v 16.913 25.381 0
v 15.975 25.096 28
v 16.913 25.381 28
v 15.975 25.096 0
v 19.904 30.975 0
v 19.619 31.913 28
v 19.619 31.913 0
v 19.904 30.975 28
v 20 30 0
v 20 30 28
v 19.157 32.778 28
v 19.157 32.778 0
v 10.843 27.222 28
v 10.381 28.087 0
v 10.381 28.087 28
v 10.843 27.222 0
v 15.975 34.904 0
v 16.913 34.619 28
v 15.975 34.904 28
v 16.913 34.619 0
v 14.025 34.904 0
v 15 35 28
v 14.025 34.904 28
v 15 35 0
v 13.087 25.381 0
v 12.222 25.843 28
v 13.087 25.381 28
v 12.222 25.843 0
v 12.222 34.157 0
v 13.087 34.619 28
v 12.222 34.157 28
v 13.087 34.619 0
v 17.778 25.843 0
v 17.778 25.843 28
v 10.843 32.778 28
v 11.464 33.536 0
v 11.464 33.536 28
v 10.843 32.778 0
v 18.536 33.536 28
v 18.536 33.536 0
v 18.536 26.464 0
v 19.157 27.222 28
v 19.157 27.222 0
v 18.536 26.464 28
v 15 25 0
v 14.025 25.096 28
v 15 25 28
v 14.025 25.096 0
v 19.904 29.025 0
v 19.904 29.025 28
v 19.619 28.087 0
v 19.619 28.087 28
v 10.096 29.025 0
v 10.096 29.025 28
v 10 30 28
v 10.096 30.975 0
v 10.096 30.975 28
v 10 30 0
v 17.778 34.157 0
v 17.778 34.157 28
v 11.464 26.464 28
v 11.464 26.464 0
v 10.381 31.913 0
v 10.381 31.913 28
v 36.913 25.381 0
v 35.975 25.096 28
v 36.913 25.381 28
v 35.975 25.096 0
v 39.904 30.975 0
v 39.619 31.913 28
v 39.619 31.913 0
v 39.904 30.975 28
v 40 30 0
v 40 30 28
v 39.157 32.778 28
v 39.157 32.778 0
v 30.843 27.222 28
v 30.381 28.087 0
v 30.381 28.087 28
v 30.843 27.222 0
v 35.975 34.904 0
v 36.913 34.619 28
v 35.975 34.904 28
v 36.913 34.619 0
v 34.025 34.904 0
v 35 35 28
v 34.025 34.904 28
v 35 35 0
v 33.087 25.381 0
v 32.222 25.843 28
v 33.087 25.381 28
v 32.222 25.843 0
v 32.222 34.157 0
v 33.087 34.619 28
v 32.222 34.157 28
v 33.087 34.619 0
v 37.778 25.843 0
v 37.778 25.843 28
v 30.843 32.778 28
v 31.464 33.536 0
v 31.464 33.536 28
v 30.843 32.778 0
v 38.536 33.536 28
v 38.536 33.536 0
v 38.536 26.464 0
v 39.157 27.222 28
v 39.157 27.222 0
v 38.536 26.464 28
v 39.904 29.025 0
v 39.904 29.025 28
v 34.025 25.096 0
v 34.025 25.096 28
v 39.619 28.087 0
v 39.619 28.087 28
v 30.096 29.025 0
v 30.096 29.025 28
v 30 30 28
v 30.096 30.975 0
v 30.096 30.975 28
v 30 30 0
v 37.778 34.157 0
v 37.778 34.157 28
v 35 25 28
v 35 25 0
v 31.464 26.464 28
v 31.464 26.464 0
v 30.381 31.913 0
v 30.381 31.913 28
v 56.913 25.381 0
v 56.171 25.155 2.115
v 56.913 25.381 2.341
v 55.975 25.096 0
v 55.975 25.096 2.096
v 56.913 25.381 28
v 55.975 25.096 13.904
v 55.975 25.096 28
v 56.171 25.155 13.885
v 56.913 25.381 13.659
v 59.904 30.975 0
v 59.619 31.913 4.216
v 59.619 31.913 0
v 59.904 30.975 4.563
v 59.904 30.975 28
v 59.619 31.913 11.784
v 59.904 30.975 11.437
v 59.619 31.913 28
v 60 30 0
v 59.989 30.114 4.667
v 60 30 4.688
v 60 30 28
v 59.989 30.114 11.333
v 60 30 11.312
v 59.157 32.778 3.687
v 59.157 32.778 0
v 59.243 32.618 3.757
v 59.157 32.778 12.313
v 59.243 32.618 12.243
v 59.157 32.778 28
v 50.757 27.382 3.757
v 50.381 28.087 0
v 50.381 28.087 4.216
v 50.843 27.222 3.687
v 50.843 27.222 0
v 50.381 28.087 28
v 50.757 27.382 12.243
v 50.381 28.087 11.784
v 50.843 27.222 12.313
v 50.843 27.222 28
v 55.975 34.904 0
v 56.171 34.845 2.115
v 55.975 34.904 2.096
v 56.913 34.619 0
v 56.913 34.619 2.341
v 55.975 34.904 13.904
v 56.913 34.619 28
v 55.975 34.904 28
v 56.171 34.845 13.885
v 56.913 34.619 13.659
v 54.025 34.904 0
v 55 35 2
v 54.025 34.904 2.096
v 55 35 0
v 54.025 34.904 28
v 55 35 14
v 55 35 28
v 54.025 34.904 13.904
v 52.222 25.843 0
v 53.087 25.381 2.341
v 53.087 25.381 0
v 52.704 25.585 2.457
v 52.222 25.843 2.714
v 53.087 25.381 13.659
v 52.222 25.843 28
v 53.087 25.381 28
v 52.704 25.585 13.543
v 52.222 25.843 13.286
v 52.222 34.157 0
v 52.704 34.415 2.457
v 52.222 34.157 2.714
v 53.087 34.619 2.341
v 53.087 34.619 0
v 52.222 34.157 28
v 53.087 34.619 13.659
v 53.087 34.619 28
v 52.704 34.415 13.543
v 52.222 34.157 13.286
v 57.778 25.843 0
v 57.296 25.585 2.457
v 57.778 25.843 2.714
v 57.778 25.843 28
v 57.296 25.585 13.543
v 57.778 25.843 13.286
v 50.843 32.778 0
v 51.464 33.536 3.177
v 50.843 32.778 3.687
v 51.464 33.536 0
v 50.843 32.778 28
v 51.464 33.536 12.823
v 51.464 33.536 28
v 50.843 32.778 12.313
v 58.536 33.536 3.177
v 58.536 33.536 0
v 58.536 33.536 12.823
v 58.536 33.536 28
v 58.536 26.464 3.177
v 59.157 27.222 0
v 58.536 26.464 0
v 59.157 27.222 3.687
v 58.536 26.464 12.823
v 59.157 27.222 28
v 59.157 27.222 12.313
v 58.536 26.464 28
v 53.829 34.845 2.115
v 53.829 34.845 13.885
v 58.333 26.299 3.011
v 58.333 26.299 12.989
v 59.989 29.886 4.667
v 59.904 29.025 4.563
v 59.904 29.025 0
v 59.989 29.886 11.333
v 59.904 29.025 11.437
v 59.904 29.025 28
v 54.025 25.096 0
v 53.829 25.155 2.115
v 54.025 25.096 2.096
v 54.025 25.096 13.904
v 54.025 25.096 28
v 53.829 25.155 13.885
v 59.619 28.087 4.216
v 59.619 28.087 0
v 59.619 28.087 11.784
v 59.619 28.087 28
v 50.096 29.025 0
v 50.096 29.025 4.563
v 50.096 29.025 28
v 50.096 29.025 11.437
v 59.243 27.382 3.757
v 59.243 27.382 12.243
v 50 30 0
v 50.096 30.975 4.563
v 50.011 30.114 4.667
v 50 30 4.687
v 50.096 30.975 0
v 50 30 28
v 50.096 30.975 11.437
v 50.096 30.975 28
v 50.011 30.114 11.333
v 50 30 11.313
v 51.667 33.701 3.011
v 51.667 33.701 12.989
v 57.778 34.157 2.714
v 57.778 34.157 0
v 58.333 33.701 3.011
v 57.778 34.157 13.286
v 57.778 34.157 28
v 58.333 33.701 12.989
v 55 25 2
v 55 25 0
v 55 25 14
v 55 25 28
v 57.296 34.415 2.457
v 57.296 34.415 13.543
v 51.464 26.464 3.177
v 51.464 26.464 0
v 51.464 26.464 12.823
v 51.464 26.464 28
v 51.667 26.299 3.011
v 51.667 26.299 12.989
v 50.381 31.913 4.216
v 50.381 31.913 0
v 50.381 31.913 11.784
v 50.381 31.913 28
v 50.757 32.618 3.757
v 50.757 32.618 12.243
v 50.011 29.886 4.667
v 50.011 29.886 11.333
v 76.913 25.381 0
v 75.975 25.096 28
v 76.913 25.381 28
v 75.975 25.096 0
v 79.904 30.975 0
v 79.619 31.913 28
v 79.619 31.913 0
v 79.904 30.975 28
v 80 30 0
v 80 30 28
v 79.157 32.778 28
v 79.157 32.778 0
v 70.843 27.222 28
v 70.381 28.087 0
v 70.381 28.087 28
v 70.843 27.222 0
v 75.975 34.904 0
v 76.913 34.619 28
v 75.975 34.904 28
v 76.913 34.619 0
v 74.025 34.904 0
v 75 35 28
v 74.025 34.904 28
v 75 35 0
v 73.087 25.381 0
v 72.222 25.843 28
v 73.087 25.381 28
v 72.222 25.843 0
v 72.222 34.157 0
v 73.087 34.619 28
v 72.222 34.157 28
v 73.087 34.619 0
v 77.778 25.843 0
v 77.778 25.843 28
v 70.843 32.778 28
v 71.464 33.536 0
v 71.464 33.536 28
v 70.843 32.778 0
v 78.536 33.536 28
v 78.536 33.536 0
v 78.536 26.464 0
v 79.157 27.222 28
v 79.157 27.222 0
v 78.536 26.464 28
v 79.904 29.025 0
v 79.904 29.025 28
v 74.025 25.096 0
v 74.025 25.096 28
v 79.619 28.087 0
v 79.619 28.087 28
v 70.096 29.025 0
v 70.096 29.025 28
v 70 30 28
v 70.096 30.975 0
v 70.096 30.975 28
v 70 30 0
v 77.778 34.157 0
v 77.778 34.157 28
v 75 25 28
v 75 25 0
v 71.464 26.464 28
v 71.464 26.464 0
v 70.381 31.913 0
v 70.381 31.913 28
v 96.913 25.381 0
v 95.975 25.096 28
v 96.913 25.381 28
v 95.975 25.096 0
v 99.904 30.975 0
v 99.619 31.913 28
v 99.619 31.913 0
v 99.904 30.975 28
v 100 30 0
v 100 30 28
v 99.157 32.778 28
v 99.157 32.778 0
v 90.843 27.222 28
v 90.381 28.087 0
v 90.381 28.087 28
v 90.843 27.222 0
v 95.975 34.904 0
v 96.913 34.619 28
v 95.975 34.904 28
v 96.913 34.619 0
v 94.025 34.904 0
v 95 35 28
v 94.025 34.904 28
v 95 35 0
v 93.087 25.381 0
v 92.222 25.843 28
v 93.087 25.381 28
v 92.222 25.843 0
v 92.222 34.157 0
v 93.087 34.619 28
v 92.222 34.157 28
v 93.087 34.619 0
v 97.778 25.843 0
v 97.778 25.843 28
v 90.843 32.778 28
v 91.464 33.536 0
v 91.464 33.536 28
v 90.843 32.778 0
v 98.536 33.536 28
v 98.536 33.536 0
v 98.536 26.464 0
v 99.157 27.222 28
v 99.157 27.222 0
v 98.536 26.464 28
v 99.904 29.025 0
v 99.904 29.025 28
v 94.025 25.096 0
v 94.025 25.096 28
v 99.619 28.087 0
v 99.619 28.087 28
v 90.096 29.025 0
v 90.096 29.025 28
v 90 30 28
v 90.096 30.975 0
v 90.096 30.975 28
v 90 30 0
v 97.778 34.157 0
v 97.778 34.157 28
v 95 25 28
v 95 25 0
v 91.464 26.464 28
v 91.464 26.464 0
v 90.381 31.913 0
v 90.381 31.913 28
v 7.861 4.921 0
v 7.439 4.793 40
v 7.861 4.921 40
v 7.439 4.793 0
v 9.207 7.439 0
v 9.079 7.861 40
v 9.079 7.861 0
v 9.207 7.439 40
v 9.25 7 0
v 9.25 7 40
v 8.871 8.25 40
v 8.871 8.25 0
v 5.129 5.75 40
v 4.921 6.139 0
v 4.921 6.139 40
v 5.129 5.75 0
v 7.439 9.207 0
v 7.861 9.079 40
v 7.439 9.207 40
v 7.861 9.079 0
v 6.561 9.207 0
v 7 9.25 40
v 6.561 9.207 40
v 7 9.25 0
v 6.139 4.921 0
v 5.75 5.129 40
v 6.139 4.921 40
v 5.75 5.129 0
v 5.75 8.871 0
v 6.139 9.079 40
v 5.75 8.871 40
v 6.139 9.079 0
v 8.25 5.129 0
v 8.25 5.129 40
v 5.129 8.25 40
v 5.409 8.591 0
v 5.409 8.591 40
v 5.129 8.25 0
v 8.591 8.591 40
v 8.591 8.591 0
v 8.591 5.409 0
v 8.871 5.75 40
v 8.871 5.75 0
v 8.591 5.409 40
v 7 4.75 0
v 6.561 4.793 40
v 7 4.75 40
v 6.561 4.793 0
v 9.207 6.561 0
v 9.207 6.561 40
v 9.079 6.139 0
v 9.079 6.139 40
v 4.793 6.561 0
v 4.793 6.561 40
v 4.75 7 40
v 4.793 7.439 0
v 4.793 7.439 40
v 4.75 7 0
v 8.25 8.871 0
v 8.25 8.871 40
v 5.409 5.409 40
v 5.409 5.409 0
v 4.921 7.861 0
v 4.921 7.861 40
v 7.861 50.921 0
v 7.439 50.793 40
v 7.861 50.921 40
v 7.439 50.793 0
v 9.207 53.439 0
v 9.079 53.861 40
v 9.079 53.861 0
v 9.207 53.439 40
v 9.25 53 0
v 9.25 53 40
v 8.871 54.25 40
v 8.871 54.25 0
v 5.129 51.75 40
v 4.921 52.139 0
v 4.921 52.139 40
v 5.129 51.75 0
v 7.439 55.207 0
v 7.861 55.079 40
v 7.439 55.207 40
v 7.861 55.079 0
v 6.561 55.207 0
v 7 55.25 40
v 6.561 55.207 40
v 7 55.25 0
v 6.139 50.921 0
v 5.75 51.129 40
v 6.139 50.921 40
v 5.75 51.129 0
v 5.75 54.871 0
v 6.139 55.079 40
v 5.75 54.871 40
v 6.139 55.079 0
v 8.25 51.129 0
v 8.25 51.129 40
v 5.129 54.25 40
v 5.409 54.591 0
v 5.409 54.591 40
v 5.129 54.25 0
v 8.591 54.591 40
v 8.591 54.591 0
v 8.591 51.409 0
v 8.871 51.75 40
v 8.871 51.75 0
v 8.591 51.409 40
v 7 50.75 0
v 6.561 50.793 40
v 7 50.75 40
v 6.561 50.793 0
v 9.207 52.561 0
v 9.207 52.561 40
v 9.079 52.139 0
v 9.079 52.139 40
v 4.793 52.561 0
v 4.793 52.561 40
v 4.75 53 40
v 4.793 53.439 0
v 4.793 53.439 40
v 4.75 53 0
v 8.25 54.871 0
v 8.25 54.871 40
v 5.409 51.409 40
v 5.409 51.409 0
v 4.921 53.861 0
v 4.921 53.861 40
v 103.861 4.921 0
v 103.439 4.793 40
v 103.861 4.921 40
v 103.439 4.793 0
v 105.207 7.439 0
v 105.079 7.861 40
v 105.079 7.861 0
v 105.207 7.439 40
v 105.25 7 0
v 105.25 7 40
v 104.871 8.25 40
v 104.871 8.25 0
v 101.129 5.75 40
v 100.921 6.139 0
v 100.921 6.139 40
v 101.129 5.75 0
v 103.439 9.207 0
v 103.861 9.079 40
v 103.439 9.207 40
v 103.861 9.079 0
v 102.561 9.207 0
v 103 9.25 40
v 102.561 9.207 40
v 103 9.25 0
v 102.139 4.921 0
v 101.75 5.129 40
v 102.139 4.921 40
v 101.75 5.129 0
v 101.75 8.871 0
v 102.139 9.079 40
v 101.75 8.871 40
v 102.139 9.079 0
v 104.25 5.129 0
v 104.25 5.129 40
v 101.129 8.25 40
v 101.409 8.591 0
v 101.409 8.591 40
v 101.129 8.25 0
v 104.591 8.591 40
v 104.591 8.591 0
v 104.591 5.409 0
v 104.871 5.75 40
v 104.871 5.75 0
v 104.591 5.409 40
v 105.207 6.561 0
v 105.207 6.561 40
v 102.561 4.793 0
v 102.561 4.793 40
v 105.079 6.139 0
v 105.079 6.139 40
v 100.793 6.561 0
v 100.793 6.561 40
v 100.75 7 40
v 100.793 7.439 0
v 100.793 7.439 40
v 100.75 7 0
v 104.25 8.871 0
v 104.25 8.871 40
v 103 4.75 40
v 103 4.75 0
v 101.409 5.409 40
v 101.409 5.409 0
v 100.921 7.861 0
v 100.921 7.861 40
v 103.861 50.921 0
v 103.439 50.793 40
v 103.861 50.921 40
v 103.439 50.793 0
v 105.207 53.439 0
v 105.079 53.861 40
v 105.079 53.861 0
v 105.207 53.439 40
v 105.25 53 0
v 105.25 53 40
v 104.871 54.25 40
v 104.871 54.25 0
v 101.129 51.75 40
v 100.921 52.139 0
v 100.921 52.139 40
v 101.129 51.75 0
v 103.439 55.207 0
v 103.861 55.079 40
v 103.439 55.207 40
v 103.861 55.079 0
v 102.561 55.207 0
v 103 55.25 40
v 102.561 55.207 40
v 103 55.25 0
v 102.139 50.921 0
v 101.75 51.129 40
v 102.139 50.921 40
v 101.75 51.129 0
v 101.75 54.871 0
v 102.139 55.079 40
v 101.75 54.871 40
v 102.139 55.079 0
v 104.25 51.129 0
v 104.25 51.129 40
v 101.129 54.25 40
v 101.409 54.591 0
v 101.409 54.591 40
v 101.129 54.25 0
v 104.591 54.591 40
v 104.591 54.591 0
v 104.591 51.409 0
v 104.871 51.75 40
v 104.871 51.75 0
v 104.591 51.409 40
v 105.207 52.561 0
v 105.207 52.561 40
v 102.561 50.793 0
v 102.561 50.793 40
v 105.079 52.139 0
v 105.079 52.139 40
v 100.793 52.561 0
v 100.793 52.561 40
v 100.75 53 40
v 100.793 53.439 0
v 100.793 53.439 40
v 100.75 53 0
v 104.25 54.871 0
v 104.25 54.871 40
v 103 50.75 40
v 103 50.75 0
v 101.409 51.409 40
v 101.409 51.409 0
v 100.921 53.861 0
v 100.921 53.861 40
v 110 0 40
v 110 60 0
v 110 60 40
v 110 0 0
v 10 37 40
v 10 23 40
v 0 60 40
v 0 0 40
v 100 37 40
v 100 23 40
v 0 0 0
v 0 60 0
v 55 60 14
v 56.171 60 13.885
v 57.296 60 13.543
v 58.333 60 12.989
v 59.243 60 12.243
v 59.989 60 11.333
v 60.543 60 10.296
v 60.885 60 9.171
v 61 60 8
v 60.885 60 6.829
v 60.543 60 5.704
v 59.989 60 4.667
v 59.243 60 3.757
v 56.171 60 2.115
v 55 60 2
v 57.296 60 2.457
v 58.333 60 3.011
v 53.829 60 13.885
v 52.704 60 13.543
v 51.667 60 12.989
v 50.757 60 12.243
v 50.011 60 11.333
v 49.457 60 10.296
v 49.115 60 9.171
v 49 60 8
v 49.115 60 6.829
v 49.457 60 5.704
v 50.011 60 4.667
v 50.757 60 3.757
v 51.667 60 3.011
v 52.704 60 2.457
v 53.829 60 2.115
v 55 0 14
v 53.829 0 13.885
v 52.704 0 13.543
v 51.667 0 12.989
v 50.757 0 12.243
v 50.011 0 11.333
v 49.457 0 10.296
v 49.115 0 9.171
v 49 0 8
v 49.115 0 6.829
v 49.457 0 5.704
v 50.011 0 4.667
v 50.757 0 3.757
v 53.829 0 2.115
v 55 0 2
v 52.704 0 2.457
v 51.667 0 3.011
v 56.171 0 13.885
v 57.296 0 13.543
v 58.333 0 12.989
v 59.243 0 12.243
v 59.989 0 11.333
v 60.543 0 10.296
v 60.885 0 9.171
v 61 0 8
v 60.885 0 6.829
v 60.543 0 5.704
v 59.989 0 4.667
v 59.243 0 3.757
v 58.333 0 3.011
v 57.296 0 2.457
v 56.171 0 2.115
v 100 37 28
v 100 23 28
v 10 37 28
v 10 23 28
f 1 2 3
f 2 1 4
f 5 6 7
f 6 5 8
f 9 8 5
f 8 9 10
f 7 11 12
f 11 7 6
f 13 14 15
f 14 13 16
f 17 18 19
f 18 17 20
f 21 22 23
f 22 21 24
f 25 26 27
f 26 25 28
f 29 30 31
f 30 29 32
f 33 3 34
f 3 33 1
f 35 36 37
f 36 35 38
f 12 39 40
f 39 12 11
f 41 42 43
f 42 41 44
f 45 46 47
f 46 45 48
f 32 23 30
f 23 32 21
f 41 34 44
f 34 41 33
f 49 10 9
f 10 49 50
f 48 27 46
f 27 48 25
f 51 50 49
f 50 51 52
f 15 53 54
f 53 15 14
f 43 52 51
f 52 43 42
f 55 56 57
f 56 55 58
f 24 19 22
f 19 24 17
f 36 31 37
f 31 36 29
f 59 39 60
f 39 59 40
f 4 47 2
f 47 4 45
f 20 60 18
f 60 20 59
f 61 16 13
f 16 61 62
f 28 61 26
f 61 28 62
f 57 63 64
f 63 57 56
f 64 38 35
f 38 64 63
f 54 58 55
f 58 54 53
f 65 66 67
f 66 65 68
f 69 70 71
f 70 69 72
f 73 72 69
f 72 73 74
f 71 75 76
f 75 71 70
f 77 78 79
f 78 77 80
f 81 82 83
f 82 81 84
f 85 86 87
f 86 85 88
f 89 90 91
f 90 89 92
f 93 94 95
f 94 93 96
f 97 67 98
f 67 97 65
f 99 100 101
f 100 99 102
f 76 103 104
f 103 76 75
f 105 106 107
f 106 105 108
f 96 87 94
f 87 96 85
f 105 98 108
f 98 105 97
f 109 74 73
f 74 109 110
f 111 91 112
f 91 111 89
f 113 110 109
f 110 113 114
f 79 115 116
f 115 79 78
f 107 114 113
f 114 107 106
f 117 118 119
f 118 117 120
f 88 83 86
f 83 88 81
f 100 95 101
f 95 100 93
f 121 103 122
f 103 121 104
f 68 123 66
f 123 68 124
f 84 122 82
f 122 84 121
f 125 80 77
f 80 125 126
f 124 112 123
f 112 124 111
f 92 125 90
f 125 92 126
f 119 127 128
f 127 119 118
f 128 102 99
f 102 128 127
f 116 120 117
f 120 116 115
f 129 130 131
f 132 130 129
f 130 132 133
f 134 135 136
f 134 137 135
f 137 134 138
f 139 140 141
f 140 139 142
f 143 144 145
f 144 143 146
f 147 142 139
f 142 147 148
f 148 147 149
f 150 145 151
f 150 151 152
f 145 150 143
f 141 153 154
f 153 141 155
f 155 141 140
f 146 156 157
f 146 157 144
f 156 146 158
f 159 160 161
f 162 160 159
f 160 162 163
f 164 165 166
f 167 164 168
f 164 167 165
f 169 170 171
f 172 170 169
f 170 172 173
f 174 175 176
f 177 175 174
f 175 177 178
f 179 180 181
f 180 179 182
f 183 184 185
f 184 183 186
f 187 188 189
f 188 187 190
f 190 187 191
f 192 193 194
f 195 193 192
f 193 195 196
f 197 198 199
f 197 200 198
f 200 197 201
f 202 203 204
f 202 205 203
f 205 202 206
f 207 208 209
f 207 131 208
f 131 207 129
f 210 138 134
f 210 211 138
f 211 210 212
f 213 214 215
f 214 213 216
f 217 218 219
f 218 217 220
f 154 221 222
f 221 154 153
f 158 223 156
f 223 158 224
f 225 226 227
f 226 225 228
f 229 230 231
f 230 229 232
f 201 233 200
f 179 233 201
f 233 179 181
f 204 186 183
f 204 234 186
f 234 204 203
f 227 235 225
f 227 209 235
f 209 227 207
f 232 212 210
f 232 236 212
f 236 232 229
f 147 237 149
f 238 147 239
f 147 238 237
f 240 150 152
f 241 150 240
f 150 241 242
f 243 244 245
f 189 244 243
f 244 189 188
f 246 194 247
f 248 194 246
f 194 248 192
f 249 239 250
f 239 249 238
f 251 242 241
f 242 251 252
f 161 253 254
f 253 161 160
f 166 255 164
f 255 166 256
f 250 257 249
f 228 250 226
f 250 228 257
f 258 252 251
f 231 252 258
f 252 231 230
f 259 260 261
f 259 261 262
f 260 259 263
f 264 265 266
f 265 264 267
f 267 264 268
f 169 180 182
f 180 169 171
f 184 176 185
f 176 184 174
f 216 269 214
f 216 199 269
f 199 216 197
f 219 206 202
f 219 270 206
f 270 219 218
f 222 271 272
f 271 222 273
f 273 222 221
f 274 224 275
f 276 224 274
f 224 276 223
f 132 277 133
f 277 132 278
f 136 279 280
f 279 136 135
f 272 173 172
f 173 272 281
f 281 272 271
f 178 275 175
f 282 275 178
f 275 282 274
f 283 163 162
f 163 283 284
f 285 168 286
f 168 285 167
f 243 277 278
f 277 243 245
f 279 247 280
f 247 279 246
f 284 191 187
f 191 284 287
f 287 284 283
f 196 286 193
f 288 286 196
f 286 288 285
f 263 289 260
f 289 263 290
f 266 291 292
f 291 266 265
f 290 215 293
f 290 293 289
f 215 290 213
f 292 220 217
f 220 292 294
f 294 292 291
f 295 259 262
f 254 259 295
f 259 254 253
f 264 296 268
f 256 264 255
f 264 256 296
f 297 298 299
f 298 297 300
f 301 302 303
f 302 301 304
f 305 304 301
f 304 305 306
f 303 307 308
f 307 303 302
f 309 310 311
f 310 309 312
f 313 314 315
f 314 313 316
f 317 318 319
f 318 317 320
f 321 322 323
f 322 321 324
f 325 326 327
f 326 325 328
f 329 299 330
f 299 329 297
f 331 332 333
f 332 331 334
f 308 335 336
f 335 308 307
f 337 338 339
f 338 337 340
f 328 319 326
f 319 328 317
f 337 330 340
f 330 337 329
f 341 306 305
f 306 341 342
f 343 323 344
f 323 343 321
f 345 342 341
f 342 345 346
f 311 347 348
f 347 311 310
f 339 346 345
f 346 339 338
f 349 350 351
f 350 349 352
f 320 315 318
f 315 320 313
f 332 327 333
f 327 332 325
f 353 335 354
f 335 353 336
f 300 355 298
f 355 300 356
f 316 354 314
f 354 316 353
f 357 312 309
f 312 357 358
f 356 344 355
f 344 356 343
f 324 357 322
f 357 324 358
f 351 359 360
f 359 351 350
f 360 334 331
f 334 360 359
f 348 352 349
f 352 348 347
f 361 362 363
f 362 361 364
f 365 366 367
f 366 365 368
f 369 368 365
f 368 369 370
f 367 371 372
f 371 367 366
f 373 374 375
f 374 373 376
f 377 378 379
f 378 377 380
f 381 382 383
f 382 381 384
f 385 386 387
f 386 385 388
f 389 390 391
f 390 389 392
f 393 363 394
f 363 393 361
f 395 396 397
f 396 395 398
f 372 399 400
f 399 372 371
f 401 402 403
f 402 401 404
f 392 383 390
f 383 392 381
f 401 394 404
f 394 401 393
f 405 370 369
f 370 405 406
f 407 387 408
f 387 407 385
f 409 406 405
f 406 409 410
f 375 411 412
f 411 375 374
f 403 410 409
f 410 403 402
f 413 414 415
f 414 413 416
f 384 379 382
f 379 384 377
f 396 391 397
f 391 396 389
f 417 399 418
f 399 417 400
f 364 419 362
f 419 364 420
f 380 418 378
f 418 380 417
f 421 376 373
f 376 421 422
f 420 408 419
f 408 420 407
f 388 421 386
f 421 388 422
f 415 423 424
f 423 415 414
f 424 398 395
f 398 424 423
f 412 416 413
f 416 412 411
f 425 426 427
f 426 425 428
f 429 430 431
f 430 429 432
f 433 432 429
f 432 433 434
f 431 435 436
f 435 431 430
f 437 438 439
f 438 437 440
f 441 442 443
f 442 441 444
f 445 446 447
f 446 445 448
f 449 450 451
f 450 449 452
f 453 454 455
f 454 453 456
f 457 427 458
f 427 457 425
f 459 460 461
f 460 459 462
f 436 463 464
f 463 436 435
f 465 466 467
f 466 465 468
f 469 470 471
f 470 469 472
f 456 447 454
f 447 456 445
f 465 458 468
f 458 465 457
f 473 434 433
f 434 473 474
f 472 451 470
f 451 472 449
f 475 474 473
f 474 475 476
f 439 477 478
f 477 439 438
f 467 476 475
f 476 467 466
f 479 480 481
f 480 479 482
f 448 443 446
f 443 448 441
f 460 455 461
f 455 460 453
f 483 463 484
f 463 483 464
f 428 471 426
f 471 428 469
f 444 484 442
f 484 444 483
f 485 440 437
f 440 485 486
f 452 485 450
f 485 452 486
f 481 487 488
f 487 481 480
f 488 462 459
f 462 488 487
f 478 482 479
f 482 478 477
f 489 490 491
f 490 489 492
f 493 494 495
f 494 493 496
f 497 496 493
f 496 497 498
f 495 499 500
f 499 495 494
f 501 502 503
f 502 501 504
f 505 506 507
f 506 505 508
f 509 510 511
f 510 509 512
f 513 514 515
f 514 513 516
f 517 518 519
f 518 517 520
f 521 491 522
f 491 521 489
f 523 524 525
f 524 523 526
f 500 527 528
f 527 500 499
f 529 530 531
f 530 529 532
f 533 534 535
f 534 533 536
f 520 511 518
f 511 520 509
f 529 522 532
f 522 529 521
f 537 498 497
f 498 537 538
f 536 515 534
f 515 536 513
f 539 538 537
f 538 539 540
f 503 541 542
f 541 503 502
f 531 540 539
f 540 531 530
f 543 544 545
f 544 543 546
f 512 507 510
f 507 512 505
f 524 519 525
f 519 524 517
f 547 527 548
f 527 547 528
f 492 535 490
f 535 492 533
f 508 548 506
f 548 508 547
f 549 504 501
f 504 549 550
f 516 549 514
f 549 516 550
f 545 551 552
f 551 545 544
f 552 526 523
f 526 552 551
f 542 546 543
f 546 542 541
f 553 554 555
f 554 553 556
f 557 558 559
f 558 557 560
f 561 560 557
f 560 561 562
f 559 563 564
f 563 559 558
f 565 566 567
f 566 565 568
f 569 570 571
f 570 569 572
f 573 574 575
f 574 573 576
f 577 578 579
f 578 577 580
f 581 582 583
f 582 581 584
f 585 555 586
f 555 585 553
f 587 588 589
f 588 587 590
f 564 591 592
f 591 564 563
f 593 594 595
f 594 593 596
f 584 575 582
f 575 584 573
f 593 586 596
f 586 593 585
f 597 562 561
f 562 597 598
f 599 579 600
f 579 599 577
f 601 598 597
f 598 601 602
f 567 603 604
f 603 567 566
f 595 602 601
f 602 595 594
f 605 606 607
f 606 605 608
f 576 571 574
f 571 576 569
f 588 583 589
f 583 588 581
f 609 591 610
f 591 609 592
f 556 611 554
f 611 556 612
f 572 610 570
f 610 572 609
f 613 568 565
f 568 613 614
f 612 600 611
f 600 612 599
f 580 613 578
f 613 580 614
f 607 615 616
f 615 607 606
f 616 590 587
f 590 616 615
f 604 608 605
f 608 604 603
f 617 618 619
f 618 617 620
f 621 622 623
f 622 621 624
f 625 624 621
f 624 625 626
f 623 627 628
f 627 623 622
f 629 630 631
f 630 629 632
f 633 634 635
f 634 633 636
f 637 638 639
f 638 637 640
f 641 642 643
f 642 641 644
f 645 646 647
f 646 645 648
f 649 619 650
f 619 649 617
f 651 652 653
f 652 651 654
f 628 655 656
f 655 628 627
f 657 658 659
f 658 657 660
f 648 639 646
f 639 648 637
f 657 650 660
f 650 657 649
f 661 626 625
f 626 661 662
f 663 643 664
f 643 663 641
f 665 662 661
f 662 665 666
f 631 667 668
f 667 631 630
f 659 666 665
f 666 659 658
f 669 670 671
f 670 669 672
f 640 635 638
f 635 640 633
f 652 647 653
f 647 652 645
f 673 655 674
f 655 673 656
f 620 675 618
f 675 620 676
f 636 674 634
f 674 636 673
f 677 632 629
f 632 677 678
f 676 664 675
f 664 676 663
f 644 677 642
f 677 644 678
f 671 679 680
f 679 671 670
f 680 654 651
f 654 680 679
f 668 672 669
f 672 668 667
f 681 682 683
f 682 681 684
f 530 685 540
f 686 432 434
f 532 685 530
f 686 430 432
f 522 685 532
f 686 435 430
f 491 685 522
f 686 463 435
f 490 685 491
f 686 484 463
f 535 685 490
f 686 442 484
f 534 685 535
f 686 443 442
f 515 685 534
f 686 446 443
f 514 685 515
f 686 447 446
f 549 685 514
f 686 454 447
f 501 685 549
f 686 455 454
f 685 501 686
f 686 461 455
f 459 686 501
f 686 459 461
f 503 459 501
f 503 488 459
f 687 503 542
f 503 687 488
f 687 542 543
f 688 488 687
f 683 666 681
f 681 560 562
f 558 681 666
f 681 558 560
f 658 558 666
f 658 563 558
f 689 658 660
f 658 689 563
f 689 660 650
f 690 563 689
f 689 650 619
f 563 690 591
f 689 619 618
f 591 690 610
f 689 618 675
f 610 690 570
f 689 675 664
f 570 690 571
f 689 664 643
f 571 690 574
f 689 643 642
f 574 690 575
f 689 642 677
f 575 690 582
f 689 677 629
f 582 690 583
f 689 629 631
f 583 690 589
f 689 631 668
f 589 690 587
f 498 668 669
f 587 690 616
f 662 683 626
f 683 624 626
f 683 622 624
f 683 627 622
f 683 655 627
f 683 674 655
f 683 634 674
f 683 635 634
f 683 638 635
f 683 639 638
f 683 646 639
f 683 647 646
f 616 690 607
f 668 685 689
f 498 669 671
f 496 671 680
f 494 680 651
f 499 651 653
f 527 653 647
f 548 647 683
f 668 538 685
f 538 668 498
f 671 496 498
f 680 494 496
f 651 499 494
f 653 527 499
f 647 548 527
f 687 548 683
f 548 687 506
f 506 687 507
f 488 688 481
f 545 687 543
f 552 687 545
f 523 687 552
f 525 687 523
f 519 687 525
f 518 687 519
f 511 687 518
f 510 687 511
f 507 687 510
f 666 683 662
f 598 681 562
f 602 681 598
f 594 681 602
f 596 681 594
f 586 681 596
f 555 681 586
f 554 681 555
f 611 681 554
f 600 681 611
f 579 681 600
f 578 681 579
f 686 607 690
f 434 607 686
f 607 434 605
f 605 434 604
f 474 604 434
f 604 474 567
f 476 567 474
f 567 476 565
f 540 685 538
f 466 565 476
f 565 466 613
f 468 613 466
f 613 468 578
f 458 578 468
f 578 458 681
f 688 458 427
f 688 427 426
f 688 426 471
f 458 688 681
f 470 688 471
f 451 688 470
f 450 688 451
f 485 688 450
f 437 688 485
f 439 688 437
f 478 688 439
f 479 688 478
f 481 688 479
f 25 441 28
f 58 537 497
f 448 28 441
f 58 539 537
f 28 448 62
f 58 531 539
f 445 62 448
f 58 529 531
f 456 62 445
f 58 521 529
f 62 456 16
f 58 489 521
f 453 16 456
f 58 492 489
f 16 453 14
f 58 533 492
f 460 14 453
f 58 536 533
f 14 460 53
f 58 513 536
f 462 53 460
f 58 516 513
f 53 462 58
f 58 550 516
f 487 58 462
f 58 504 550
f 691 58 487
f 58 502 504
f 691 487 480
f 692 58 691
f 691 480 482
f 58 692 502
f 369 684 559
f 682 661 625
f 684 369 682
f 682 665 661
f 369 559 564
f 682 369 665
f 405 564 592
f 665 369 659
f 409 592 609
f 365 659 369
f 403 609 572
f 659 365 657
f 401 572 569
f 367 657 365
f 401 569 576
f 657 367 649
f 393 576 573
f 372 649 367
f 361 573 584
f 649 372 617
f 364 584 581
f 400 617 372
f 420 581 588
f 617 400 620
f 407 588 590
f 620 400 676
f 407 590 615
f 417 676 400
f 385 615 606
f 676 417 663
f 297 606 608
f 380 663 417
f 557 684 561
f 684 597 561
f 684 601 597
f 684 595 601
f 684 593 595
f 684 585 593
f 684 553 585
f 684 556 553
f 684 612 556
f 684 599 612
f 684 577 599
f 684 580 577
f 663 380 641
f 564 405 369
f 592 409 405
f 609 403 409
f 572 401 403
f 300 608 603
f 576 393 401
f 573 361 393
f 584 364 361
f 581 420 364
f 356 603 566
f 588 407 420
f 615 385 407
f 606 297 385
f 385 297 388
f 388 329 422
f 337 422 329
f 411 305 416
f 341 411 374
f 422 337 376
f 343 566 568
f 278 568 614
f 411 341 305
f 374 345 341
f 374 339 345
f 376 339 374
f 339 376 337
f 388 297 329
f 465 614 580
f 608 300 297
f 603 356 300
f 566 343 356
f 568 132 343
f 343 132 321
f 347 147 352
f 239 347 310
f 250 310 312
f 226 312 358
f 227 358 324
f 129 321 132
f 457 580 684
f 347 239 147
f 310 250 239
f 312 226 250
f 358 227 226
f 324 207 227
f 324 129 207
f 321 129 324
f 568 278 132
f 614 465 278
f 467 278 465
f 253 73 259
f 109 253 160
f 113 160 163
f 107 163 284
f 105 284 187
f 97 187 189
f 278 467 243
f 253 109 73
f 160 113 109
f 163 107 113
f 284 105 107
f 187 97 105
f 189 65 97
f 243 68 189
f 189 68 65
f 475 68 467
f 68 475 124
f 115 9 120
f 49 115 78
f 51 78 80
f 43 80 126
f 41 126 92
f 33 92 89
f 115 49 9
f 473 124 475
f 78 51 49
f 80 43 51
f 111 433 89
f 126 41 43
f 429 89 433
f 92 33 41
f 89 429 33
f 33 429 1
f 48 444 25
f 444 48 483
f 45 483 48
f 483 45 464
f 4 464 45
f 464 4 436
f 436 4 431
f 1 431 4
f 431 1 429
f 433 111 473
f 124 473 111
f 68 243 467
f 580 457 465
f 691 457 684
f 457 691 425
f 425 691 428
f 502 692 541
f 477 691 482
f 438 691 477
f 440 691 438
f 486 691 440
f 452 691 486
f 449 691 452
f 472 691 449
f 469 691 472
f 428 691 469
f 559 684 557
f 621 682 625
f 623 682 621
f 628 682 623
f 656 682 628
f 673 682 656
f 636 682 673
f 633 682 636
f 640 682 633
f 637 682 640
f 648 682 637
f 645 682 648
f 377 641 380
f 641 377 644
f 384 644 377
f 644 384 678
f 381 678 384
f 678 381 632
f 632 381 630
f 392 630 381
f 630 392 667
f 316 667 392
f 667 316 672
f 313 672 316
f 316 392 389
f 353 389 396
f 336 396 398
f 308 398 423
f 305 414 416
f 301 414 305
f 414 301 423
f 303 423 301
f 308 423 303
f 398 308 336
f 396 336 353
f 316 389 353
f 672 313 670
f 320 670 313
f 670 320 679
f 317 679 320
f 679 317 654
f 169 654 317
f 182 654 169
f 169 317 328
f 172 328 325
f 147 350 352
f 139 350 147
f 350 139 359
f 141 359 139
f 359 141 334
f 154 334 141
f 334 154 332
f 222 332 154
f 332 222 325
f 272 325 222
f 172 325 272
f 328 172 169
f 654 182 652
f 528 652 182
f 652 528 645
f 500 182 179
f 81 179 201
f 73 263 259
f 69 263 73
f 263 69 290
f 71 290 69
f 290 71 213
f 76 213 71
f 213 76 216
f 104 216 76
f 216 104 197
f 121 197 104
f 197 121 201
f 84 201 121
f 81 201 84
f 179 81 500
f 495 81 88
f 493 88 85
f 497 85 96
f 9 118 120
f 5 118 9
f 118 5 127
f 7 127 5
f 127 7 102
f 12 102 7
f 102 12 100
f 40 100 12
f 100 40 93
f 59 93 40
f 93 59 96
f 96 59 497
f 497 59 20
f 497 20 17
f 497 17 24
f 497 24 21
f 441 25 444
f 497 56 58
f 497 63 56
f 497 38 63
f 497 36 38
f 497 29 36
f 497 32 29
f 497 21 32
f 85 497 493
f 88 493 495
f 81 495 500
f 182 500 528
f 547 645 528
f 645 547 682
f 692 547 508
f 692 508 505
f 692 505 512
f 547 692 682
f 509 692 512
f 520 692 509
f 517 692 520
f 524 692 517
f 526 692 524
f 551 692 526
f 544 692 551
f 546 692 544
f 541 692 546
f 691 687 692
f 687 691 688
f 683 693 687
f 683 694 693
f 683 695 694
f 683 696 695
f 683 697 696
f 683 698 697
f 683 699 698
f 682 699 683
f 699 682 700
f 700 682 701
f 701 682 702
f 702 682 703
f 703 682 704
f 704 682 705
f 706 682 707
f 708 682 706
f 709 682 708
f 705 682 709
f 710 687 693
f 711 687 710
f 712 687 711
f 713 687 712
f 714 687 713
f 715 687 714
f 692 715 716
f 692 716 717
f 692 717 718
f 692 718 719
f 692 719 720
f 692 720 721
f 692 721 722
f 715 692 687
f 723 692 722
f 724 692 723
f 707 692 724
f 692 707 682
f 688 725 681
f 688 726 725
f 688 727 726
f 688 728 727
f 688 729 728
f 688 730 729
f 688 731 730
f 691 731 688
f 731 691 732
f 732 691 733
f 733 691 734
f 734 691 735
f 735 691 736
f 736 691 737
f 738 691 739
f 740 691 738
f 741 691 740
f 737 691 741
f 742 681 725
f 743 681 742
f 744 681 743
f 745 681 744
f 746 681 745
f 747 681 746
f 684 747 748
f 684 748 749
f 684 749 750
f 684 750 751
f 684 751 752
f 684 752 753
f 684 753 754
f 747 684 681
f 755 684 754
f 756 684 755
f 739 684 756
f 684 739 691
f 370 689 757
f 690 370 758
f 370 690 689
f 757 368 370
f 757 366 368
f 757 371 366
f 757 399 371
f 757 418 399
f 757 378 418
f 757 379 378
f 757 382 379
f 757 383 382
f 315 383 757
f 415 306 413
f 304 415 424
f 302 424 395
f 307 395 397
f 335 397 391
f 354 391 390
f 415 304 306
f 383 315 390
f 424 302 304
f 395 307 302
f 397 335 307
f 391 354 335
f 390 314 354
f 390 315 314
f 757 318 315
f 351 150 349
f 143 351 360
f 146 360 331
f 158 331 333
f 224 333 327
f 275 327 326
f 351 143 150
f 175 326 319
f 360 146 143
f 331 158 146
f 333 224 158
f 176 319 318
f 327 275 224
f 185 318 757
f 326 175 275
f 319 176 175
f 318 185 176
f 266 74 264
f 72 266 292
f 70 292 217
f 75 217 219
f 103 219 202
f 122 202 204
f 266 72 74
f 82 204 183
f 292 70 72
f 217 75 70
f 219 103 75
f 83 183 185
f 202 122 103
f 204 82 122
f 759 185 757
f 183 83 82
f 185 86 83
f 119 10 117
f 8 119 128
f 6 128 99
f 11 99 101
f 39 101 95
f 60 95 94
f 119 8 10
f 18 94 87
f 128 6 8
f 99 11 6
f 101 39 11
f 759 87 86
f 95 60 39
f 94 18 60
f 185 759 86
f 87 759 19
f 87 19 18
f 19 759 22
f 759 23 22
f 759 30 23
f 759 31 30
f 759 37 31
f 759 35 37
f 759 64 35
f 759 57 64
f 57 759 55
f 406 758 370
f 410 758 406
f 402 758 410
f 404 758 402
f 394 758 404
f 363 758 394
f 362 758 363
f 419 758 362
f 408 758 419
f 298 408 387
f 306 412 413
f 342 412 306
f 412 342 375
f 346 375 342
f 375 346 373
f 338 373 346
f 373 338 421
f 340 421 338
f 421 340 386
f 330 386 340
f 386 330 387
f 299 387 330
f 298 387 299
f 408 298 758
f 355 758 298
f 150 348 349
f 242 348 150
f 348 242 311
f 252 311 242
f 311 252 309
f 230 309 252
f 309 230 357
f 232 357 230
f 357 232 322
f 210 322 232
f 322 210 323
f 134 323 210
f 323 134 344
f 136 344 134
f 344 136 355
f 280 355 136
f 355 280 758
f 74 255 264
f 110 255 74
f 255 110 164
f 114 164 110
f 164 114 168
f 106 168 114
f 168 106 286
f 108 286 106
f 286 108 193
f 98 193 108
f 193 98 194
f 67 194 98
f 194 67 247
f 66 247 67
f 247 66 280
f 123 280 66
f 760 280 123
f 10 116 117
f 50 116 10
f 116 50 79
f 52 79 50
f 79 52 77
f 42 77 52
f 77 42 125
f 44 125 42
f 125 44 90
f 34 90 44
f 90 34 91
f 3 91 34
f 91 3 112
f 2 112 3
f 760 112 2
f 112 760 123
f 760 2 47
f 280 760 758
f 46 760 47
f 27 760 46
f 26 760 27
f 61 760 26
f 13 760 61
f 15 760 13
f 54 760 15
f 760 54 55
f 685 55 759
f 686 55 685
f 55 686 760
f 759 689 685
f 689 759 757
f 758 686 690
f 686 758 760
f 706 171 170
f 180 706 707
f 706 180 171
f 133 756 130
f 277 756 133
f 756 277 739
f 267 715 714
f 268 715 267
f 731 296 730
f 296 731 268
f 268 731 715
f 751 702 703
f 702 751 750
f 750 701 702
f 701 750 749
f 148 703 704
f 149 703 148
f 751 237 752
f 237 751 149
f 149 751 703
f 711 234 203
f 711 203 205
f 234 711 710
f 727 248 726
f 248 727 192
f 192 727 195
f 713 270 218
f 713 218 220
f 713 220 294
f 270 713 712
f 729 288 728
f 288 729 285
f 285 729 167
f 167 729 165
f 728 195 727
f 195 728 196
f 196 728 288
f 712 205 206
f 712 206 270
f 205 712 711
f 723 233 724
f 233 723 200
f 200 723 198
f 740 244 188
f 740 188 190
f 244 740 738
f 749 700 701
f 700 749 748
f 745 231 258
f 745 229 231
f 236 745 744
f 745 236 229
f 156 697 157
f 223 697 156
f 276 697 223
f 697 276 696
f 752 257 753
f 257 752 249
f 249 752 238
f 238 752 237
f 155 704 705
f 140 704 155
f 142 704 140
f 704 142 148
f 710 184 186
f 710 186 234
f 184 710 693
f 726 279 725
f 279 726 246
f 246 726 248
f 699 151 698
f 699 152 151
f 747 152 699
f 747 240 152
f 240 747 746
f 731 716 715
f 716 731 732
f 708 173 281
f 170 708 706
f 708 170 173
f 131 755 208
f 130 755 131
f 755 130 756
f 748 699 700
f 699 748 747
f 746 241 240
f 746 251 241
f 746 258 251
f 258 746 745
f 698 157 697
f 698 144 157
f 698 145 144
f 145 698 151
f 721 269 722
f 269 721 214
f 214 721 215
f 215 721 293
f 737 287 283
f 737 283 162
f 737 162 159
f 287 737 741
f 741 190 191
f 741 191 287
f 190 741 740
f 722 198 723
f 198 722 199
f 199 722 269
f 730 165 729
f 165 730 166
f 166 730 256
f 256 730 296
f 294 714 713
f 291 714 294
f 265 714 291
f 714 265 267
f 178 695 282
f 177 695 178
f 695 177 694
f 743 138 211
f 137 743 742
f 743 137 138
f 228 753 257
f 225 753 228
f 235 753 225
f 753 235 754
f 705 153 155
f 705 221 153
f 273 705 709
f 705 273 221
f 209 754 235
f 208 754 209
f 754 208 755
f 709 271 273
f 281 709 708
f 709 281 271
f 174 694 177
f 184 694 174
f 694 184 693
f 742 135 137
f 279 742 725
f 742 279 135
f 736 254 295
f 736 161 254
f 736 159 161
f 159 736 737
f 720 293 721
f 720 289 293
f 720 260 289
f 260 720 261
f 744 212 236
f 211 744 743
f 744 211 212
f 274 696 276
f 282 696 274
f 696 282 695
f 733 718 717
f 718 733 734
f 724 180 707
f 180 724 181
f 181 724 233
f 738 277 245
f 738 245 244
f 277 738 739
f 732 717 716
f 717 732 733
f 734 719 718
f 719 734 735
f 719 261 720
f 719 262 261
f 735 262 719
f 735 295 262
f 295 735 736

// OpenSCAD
$fn = 32;
// target_bbox: 110, 60, 40
// ----------------------------------------------------------------------
// Manifold block: side_outlet manifold
// ----------------------------------------------------------------------

// --- parameters (mm) ---
block_l = 110;            // block length, X
block_w = 60;             // block width, Y
block_h = 40;             // block height, Z
port_d = 10;              // port bore diameter
port_pitch = 20;          // port pitch along X
gallery_d = 14;           // top gallery width, Y
gallery_depth = 12;       // gallery pocket depth
wall_p = 10;              // gallery end wall thickness, X
mnt_d = 4.5;              // mounting hole diameter
mnt_in = 7;               // mounting hole inset from the edges
out_d = 12;               // outlet bore diameter
out_z = 8;                // outlet axis height

n_ports = 5;  // ports in the row
port_x0 = (block_l - (n_ports - 1) * port_pitch) / 2;  // first port X

difference() {
  cube([block_l, block_w, block_h]);
  for (i = [0 : n_ports - 1])
    translate([port_x0 + i * port_pitch, block_w / 2, -1])
      cylinder(h = block_h + 2, d = port_d);
  translate([wall_p, block_w / 2 - gallery_d / 2, block_h - gallery_depth])
    cube([block_l - 2 * wall_p, gallery_d, gallery_depth + 1]);
  for (cx = [mnt_in, block_l - mnt_in])
    for (cy = [mnt_in, block_w - mnt_in])
      translate([cx, cy, -1]) cylinder(h = block_h + 2, d = mnt_d);
  translate([block_l / 2, -1, out_z]) rotate([-90, 0, 0])
    cylinder(h = block_w + 2, d = out_d);
}
